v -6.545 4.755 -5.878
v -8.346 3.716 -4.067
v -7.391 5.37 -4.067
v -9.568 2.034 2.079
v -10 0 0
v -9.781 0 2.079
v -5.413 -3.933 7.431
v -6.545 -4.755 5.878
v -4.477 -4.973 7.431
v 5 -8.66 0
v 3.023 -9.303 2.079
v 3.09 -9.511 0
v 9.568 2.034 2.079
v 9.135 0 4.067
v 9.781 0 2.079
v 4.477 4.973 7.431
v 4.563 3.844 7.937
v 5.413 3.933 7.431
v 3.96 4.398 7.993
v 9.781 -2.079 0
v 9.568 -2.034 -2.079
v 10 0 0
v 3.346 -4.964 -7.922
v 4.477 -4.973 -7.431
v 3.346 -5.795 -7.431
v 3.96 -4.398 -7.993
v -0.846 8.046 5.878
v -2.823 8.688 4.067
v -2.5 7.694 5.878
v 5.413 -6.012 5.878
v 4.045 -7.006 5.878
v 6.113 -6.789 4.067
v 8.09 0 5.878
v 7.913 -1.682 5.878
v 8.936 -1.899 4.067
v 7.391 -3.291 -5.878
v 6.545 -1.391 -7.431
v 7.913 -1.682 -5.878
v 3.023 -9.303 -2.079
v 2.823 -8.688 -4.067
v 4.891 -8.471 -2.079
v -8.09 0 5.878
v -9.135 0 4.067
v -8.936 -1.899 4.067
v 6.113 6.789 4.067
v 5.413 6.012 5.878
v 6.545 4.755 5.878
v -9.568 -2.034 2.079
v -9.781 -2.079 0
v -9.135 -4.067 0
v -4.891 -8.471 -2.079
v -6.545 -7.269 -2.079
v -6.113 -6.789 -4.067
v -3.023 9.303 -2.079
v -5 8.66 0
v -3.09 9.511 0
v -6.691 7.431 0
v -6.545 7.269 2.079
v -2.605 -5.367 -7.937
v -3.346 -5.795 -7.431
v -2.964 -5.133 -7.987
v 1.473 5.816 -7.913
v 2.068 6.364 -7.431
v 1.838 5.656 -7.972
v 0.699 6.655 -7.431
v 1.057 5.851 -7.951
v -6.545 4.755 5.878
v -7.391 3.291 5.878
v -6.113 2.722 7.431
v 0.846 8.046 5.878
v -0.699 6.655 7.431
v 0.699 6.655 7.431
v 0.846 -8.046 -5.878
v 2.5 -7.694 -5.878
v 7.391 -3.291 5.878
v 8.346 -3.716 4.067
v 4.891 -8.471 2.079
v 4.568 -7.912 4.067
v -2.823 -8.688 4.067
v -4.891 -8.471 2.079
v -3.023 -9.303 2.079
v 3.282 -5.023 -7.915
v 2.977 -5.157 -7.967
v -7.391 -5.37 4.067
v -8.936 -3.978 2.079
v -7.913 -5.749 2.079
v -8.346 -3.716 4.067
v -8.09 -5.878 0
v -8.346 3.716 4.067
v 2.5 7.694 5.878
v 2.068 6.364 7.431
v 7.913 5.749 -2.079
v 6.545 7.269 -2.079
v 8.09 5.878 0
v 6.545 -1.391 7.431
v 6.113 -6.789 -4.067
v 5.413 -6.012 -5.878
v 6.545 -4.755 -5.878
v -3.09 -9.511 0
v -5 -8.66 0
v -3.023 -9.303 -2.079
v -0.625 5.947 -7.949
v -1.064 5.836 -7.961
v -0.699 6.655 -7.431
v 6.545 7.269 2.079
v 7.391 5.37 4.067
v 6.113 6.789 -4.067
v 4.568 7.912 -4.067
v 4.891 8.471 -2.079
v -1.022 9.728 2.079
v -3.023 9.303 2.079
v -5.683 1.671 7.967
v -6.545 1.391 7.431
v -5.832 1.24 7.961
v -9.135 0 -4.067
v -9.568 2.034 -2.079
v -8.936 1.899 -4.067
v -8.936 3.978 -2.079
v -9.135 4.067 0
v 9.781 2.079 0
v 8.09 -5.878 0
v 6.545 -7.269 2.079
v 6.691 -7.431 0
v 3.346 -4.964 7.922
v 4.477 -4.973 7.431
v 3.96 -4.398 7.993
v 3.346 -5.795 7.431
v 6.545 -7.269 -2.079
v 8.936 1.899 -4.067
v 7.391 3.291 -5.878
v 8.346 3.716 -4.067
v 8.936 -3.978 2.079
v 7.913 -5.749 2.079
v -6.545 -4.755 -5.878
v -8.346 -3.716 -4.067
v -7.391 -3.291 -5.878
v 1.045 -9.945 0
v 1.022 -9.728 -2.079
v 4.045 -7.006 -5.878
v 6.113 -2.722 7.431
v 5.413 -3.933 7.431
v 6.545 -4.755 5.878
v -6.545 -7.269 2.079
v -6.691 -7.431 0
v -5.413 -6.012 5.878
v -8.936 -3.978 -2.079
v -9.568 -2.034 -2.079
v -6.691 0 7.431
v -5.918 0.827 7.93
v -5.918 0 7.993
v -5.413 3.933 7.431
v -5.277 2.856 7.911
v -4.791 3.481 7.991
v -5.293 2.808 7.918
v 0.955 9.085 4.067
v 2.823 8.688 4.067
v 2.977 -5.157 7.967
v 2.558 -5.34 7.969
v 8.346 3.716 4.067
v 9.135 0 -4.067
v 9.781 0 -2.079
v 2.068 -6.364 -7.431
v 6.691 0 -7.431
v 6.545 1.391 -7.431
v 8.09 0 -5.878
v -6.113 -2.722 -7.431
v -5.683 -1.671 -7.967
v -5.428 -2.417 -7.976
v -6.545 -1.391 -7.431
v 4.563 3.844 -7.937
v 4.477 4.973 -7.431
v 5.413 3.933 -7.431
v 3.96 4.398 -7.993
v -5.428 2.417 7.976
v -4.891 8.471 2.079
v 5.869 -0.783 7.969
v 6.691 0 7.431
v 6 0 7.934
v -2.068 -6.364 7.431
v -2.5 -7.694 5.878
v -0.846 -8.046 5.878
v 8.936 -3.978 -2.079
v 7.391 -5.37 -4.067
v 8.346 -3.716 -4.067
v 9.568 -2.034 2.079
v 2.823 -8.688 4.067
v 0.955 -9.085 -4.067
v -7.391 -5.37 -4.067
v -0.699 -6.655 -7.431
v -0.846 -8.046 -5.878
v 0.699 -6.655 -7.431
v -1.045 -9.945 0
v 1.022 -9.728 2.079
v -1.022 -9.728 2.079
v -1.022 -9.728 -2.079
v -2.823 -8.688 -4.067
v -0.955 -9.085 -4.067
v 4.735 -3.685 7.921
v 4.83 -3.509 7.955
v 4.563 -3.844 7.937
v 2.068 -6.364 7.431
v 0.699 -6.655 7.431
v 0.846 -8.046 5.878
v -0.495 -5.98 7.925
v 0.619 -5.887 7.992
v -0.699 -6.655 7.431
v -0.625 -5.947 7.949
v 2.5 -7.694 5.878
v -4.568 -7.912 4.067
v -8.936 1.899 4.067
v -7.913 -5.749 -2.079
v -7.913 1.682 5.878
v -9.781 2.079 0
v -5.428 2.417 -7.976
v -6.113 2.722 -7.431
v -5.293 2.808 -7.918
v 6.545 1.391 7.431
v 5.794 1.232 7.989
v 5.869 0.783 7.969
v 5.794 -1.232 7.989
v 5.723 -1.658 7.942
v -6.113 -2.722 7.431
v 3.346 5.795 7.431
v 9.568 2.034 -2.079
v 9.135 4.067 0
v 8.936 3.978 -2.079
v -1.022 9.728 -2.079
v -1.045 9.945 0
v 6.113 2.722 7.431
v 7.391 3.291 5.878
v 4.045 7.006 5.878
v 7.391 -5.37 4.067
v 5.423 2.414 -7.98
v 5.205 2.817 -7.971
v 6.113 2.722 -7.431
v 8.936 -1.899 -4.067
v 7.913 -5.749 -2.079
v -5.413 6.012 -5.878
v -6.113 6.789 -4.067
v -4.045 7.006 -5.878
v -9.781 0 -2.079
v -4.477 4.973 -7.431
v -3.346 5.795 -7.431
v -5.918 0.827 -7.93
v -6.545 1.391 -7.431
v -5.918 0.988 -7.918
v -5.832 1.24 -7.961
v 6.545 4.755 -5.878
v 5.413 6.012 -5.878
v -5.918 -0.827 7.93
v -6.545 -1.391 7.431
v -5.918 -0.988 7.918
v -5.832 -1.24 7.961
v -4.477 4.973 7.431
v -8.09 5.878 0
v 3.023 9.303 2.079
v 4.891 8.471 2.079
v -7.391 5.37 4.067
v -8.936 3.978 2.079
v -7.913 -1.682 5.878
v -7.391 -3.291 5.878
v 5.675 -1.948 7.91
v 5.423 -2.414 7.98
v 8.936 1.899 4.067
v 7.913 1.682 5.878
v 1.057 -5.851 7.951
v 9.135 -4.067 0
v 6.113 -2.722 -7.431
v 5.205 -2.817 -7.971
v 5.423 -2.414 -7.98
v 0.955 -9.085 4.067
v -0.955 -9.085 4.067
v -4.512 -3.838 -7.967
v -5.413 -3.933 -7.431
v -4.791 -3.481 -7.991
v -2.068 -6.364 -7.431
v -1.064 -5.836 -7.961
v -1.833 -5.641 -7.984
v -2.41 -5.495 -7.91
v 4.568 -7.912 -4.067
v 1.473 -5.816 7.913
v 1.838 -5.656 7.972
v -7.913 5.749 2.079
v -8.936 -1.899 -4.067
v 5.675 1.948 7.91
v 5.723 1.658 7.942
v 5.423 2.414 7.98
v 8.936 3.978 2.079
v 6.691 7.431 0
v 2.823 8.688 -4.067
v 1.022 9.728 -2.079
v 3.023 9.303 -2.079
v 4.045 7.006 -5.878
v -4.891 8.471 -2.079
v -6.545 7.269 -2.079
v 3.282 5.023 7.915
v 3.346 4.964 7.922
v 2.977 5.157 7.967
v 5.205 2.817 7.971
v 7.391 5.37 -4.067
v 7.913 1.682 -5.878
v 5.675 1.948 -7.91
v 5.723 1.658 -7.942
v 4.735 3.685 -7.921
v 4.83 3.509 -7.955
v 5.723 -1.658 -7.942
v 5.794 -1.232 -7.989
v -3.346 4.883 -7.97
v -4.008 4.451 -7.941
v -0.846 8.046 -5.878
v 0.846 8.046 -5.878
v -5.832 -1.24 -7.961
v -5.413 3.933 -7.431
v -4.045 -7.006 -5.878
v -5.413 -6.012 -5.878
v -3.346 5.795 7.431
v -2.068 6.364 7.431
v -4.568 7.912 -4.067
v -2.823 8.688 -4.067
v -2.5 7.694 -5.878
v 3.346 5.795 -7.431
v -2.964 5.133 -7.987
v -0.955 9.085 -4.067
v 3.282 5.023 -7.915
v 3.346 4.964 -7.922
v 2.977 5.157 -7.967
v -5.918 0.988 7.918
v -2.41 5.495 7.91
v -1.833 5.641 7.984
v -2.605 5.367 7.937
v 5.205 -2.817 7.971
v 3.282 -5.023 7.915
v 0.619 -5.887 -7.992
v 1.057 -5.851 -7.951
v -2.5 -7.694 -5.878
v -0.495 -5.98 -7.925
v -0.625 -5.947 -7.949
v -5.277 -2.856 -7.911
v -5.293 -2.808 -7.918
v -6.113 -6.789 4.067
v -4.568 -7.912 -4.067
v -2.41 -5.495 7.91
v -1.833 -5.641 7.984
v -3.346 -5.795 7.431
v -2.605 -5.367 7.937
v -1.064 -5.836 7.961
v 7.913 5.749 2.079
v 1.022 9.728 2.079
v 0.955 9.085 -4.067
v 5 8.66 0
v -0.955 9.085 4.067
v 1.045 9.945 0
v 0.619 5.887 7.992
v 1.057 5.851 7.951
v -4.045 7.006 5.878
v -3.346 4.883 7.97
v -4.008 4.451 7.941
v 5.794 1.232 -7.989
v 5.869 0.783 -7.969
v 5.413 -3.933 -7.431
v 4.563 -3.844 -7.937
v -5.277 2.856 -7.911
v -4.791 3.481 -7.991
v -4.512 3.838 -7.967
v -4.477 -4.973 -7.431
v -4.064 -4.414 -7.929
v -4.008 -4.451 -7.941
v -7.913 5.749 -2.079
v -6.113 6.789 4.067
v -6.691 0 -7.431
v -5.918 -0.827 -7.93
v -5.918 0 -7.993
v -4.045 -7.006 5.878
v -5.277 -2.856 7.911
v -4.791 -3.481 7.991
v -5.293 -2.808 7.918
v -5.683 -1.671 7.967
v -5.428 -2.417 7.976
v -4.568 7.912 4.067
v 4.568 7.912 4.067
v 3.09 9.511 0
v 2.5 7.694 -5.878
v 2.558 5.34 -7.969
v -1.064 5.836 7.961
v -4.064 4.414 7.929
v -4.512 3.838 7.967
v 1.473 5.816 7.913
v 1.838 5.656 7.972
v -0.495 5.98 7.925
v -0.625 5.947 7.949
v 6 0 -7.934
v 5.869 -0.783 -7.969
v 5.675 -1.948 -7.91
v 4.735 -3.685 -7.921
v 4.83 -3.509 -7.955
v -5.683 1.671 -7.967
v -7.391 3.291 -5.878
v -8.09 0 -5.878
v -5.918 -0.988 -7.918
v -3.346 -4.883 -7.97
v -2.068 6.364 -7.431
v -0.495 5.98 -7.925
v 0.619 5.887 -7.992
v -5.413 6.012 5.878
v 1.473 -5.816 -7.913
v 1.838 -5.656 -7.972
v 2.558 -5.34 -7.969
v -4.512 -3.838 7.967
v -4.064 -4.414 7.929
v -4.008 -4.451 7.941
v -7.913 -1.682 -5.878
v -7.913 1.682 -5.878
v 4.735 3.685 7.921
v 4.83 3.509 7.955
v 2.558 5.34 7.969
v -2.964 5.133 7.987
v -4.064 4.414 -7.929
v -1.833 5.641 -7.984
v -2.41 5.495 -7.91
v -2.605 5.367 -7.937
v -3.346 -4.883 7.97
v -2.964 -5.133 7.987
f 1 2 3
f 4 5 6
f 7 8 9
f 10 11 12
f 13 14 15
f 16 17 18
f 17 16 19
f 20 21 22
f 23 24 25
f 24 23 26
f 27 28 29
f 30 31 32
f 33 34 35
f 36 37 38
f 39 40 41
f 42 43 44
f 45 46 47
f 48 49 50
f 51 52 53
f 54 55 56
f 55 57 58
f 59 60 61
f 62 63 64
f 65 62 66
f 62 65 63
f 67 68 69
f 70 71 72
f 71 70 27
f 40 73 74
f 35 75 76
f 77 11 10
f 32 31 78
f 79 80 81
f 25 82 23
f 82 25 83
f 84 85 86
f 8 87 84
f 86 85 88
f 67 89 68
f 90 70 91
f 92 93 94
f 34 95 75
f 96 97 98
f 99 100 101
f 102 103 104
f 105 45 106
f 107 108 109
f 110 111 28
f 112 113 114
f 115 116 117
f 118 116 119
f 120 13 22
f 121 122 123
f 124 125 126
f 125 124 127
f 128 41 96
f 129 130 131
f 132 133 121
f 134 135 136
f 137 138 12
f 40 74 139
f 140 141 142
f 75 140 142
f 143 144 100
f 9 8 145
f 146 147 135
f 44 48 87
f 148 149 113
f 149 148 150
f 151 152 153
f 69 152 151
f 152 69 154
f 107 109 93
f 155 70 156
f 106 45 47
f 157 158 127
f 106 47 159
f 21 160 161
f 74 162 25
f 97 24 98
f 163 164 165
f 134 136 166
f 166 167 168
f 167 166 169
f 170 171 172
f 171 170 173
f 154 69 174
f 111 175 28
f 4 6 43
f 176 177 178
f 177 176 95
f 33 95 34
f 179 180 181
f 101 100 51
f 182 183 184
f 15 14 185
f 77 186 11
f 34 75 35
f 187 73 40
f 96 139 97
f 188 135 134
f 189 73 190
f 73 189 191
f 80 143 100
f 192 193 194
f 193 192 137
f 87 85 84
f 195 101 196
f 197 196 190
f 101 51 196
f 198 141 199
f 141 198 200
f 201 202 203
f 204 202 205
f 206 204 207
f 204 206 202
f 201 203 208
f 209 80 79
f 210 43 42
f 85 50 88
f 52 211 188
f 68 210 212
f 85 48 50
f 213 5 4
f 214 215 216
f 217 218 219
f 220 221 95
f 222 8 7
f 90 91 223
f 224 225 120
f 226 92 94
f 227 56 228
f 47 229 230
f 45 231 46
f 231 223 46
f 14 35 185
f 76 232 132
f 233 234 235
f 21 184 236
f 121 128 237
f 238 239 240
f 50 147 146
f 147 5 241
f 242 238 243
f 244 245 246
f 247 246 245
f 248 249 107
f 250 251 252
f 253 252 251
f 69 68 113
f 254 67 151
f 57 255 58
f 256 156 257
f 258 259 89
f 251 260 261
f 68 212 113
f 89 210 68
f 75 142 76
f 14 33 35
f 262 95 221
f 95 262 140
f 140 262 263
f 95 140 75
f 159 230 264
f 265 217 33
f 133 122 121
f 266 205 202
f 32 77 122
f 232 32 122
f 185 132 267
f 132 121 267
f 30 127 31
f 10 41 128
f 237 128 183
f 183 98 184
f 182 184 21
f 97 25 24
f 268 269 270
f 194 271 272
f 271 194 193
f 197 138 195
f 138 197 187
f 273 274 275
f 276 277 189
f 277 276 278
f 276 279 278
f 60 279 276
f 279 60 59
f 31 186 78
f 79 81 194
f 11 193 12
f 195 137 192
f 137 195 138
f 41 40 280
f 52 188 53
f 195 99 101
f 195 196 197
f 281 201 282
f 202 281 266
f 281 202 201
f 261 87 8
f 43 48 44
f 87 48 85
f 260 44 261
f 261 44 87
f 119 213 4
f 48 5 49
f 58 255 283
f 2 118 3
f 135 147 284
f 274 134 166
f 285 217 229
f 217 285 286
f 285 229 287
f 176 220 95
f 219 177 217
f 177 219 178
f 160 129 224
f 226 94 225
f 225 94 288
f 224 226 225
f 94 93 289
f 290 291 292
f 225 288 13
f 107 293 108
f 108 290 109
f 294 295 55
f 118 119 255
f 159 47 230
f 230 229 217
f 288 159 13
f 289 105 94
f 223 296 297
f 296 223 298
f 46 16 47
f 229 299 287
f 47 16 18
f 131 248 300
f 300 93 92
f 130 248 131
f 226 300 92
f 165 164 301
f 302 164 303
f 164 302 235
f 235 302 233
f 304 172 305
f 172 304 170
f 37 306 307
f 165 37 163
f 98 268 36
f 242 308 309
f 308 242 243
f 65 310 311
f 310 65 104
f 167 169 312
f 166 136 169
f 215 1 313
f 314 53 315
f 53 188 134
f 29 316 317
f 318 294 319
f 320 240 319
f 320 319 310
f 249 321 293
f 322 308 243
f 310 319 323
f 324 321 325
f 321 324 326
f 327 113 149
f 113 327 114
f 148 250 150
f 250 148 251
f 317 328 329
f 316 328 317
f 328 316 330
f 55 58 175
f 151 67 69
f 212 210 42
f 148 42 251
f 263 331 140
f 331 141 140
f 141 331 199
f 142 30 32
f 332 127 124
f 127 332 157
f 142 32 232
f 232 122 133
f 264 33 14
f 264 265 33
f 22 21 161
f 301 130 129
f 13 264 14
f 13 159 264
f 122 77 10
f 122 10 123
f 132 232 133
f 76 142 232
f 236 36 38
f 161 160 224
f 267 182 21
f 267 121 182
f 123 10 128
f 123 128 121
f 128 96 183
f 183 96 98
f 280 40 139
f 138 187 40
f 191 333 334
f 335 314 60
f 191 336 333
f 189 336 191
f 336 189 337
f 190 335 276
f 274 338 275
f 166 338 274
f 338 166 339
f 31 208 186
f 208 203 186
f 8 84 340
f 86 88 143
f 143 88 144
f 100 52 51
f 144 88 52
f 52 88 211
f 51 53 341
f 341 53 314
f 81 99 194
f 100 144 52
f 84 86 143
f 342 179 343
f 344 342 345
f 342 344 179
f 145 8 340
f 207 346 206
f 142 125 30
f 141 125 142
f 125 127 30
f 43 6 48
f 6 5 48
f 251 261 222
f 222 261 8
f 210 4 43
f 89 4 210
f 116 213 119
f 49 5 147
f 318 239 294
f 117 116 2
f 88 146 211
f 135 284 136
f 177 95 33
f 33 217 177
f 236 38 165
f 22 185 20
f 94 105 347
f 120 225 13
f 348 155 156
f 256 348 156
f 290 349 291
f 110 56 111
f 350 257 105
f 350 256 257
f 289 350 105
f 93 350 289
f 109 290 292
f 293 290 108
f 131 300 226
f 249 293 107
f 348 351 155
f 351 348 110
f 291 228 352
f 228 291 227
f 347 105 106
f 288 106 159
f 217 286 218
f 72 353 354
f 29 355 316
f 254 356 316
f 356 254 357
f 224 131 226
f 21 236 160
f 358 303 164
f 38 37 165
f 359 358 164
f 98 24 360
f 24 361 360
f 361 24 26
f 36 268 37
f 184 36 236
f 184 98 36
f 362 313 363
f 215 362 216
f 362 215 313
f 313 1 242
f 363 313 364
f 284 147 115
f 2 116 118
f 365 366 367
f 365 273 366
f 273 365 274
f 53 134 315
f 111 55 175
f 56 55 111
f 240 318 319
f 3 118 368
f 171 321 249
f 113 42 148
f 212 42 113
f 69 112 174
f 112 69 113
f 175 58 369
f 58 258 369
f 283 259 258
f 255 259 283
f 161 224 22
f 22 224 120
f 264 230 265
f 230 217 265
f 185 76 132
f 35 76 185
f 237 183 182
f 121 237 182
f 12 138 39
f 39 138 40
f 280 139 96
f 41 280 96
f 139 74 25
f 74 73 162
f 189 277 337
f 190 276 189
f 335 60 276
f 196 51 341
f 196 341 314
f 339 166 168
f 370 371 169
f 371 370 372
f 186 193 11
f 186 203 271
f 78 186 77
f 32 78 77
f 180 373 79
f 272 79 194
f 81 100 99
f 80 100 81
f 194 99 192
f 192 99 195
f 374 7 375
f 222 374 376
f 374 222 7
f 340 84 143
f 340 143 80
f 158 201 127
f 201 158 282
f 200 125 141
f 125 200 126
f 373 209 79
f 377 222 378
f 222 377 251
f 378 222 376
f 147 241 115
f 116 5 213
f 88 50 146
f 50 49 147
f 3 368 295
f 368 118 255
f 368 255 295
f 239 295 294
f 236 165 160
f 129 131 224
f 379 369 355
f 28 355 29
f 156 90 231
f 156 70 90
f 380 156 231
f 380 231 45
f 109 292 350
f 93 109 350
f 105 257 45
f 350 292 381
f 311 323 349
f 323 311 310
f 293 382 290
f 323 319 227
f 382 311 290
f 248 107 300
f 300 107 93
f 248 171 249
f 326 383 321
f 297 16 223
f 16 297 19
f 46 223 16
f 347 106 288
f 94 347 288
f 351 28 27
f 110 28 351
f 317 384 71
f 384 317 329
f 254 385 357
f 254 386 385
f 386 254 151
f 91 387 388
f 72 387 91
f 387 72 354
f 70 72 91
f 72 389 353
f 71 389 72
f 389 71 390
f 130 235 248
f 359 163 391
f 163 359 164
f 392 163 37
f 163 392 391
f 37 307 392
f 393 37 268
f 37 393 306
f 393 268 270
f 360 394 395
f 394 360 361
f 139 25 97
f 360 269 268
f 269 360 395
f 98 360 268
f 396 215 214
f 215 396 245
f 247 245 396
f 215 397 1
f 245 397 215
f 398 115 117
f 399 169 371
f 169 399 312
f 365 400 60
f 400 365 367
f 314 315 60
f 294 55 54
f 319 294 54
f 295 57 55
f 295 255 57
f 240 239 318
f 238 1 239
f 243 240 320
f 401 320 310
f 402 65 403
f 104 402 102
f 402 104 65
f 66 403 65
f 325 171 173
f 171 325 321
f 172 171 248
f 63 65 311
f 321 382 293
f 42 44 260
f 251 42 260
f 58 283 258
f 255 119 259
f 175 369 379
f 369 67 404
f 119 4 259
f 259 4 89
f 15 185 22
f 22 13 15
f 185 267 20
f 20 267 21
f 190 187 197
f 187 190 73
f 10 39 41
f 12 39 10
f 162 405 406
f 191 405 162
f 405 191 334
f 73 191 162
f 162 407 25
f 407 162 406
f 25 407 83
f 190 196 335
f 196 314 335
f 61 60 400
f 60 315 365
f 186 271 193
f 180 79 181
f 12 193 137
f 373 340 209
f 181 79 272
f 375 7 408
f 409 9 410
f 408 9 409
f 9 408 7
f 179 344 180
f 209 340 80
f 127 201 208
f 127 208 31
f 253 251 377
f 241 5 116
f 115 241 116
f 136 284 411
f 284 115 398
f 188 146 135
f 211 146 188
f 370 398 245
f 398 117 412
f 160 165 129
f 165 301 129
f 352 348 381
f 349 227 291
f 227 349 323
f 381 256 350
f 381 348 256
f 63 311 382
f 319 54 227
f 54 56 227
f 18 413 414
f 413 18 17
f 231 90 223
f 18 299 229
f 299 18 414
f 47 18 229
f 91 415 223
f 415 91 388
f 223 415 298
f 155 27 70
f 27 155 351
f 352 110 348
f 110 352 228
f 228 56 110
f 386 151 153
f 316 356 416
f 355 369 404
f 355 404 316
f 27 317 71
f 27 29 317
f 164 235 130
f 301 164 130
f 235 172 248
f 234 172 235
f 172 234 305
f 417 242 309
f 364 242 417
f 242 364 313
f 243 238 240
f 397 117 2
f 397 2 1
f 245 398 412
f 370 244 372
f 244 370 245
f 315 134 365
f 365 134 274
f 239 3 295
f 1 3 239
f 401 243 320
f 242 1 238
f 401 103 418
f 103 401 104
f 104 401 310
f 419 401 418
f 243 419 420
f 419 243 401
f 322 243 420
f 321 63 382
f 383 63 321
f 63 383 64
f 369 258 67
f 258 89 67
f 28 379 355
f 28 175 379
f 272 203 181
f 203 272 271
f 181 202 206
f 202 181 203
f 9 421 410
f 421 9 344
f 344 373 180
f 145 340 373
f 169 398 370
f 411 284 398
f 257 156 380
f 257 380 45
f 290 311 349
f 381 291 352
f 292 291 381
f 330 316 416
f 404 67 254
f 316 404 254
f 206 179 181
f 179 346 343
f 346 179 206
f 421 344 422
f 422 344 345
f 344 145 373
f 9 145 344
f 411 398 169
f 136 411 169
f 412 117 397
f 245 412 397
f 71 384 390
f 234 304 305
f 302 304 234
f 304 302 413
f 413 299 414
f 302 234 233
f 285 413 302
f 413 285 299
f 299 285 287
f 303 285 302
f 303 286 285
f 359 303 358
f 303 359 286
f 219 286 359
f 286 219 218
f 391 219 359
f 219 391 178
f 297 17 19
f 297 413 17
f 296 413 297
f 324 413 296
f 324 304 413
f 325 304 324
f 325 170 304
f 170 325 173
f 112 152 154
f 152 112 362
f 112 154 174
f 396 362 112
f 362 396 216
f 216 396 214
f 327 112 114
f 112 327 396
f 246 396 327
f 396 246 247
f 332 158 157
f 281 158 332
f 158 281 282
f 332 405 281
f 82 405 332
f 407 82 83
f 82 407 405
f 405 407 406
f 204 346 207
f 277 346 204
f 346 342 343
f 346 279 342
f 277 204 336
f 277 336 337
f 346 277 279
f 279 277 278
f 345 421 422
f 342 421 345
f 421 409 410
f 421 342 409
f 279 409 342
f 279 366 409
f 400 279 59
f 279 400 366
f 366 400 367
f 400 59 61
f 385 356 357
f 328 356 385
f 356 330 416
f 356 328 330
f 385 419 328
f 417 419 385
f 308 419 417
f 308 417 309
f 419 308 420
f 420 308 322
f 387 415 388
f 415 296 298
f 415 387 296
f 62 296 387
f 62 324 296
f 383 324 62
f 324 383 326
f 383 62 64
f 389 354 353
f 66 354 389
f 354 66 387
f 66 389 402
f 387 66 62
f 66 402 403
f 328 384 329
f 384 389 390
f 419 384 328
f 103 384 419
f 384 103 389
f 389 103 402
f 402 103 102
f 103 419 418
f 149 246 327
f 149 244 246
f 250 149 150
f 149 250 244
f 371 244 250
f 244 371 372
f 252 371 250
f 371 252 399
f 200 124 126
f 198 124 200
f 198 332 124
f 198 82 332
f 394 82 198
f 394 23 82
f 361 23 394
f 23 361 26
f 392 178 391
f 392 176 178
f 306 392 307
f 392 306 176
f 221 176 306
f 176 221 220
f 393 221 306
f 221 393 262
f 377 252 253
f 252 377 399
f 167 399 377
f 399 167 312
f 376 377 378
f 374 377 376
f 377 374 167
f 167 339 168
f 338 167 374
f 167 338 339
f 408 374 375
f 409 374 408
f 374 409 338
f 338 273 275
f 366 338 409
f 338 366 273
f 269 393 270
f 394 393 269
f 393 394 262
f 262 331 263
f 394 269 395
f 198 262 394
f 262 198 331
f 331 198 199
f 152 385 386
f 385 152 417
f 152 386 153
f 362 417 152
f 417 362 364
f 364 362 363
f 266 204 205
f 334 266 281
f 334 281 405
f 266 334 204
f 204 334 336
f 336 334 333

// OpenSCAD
module transparent() {
 %child();
}

difference() {
  sphere(r=10);
  transparent() cylinder(h=30, r=6, center=true);
}
